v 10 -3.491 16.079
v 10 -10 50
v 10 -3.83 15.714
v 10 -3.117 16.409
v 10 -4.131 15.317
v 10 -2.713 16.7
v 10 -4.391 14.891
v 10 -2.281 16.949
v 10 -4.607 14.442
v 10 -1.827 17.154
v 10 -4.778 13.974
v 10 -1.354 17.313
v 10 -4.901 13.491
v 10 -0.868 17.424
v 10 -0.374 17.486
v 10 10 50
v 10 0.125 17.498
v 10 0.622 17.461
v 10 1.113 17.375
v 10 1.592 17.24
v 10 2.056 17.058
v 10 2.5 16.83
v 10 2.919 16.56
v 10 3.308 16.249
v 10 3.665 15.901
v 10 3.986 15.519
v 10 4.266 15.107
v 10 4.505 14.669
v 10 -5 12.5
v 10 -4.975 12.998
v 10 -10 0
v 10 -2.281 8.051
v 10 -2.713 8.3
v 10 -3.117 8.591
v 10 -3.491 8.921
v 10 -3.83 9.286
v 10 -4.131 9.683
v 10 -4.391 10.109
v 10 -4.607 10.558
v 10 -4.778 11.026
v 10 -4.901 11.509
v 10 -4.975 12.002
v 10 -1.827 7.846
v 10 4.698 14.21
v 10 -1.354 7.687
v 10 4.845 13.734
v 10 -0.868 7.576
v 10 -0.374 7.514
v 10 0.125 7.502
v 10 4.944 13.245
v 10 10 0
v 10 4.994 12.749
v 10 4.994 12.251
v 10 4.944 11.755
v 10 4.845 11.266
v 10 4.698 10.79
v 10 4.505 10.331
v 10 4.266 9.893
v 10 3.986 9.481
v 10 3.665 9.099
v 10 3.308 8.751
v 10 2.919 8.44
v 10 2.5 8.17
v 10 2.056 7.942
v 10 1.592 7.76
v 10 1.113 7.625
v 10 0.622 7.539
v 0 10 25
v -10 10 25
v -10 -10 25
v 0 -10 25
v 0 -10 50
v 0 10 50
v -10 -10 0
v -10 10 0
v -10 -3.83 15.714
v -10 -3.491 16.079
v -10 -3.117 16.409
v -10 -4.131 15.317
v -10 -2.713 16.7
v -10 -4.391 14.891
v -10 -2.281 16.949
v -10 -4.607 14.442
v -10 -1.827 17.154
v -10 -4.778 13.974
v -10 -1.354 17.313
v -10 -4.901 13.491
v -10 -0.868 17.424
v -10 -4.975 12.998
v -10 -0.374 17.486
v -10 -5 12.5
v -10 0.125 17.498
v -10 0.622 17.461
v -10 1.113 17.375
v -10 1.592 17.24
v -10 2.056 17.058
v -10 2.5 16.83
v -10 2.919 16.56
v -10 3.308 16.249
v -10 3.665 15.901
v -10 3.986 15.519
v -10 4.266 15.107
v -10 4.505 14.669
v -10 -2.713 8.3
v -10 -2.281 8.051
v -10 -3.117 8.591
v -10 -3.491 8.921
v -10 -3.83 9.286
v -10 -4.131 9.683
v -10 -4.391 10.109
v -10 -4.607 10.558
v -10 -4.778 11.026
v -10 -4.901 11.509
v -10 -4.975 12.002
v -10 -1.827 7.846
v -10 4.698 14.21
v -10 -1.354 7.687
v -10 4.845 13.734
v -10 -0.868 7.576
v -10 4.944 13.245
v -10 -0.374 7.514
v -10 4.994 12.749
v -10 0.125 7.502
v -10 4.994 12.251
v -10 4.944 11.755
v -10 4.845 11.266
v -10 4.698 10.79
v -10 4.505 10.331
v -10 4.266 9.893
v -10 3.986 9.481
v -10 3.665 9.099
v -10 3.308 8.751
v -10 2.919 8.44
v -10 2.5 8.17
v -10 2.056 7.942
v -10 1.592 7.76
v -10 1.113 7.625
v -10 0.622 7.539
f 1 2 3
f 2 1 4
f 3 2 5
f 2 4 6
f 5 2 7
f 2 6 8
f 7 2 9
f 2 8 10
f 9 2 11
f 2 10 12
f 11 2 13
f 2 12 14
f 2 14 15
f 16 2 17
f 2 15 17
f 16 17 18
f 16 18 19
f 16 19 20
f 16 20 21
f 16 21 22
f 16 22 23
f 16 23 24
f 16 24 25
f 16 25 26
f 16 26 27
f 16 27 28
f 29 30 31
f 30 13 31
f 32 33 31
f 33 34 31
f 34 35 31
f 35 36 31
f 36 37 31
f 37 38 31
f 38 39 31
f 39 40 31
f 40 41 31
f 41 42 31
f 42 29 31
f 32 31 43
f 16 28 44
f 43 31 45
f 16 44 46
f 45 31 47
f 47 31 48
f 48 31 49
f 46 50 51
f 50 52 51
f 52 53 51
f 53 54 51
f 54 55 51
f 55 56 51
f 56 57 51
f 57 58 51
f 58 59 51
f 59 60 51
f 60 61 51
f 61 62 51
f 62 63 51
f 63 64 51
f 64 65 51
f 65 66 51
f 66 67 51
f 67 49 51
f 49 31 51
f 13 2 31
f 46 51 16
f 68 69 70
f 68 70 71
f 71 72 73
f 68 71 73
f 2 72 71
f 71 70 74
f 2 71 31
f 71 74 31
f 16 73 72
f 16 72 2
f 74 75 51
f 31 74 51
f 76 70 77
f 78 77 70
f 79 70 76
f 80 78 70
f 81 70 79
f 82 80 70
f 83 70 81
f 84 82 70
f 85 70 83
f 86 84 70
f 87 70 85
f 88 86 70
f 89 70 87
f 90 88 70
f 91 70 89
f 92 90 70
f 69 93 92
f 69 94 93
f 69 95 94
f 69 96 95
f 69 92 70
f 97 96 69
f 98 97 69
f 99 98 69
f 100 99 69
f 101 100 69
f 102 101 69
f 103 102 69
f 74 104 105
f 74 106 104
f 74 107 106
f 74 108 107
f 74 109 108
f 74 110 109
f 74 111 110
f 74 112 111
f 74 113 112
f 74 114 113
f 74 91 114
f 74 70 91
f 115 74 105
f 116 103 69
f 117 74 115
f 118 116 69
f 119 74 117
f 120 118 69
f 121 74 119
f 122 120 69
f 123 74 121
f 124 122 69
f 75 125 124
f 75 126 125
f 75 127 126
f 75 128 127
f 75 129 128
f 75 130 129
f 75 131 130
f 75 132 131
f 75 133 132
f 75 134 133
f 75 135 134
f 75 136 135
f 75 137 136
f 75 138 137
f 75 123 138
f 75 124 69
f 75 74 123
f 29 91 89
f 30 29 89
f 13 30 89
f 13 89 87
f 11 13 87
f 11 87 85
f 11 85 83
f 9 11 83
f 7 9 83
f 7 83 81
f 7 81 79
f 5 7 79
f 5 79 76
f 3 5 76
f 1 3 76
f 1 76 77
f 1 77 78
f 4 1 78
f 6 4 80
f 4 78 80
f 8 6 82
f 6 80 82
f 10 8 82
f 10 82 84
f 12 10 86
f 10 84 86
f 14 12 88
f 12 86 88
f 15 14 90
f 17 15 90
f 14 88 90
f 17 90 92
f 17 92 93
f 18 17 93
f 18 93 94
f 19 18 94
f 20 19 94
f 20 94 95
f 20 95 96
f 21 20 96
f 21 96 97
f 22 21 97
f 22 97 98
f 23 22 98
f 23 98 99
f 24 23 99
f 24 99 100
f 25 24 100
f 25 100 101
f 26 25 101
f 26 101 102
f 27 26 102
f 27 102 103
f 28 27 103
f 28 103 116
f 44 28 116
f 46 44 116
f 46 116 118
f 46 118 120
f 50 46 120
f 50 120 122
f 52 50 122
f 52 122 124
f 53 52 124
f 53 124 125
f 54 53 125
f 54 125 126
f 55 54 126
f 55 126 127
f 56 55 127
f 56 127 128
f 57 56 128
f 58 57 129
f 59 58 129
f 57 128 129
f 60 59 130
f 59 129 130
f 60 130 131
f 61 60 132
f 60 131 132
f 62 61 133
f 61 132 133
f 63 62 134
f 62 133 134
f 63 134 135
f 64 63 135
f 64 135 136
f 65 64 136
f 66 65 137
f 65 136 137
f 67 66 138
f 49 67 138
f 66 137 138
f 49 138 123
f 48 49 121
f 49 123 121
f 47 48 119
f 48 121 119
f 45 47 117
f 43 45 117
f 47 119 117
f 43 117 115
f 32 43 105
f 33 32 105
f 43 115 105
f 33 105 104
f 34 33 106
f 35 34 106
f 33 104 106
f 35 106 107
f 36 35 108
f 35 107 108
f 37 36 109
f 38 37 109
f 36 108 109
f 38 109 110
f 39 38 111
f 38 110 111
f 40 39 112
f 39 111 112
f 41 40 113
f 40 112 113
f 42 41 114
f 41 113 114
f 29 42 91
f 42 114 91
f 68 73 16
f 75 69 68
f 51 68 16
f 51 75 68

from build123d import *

# Parameters (mm, degrees)
F0_W     = 20
F0_H     = 20
F1_DEPTH = 50
F2_W     = 10
F2_H     = 20
F3_DEPTH = 25
F4_R     = 5
F5_DEPTH = 50


with BuildPart() as f1:
    # F0 (on Top) → F1 (new body)
    with BuildSketch(Plane.XY):
        Rectangle(F0_W, F0_H)
    extrude(amount=F1_DEPTH)

    # F2 (on face) → F3 (cut)
    with BuildSketch(Plane.XY.offset(50)):
        with Locations((-5, 0)):
            Rectangle(F2_W, F2_H)
    extrude(amount=-F3_DEPTH, mode=Mode.SUBTRACT)

    # F4 (on face) → F5 (cut)
    with BuildSketch(Plane(origin=(-10, 0, 0), x_dir=(0, -1, 0), z_dir=(-1, 0, 0))):
        with Locations((0, 12.5)):
            Circle(F4_R)
    extrude(amount=-F5_DEPTH, mode=Mode.SUBTRACT)


solid = f1.part
